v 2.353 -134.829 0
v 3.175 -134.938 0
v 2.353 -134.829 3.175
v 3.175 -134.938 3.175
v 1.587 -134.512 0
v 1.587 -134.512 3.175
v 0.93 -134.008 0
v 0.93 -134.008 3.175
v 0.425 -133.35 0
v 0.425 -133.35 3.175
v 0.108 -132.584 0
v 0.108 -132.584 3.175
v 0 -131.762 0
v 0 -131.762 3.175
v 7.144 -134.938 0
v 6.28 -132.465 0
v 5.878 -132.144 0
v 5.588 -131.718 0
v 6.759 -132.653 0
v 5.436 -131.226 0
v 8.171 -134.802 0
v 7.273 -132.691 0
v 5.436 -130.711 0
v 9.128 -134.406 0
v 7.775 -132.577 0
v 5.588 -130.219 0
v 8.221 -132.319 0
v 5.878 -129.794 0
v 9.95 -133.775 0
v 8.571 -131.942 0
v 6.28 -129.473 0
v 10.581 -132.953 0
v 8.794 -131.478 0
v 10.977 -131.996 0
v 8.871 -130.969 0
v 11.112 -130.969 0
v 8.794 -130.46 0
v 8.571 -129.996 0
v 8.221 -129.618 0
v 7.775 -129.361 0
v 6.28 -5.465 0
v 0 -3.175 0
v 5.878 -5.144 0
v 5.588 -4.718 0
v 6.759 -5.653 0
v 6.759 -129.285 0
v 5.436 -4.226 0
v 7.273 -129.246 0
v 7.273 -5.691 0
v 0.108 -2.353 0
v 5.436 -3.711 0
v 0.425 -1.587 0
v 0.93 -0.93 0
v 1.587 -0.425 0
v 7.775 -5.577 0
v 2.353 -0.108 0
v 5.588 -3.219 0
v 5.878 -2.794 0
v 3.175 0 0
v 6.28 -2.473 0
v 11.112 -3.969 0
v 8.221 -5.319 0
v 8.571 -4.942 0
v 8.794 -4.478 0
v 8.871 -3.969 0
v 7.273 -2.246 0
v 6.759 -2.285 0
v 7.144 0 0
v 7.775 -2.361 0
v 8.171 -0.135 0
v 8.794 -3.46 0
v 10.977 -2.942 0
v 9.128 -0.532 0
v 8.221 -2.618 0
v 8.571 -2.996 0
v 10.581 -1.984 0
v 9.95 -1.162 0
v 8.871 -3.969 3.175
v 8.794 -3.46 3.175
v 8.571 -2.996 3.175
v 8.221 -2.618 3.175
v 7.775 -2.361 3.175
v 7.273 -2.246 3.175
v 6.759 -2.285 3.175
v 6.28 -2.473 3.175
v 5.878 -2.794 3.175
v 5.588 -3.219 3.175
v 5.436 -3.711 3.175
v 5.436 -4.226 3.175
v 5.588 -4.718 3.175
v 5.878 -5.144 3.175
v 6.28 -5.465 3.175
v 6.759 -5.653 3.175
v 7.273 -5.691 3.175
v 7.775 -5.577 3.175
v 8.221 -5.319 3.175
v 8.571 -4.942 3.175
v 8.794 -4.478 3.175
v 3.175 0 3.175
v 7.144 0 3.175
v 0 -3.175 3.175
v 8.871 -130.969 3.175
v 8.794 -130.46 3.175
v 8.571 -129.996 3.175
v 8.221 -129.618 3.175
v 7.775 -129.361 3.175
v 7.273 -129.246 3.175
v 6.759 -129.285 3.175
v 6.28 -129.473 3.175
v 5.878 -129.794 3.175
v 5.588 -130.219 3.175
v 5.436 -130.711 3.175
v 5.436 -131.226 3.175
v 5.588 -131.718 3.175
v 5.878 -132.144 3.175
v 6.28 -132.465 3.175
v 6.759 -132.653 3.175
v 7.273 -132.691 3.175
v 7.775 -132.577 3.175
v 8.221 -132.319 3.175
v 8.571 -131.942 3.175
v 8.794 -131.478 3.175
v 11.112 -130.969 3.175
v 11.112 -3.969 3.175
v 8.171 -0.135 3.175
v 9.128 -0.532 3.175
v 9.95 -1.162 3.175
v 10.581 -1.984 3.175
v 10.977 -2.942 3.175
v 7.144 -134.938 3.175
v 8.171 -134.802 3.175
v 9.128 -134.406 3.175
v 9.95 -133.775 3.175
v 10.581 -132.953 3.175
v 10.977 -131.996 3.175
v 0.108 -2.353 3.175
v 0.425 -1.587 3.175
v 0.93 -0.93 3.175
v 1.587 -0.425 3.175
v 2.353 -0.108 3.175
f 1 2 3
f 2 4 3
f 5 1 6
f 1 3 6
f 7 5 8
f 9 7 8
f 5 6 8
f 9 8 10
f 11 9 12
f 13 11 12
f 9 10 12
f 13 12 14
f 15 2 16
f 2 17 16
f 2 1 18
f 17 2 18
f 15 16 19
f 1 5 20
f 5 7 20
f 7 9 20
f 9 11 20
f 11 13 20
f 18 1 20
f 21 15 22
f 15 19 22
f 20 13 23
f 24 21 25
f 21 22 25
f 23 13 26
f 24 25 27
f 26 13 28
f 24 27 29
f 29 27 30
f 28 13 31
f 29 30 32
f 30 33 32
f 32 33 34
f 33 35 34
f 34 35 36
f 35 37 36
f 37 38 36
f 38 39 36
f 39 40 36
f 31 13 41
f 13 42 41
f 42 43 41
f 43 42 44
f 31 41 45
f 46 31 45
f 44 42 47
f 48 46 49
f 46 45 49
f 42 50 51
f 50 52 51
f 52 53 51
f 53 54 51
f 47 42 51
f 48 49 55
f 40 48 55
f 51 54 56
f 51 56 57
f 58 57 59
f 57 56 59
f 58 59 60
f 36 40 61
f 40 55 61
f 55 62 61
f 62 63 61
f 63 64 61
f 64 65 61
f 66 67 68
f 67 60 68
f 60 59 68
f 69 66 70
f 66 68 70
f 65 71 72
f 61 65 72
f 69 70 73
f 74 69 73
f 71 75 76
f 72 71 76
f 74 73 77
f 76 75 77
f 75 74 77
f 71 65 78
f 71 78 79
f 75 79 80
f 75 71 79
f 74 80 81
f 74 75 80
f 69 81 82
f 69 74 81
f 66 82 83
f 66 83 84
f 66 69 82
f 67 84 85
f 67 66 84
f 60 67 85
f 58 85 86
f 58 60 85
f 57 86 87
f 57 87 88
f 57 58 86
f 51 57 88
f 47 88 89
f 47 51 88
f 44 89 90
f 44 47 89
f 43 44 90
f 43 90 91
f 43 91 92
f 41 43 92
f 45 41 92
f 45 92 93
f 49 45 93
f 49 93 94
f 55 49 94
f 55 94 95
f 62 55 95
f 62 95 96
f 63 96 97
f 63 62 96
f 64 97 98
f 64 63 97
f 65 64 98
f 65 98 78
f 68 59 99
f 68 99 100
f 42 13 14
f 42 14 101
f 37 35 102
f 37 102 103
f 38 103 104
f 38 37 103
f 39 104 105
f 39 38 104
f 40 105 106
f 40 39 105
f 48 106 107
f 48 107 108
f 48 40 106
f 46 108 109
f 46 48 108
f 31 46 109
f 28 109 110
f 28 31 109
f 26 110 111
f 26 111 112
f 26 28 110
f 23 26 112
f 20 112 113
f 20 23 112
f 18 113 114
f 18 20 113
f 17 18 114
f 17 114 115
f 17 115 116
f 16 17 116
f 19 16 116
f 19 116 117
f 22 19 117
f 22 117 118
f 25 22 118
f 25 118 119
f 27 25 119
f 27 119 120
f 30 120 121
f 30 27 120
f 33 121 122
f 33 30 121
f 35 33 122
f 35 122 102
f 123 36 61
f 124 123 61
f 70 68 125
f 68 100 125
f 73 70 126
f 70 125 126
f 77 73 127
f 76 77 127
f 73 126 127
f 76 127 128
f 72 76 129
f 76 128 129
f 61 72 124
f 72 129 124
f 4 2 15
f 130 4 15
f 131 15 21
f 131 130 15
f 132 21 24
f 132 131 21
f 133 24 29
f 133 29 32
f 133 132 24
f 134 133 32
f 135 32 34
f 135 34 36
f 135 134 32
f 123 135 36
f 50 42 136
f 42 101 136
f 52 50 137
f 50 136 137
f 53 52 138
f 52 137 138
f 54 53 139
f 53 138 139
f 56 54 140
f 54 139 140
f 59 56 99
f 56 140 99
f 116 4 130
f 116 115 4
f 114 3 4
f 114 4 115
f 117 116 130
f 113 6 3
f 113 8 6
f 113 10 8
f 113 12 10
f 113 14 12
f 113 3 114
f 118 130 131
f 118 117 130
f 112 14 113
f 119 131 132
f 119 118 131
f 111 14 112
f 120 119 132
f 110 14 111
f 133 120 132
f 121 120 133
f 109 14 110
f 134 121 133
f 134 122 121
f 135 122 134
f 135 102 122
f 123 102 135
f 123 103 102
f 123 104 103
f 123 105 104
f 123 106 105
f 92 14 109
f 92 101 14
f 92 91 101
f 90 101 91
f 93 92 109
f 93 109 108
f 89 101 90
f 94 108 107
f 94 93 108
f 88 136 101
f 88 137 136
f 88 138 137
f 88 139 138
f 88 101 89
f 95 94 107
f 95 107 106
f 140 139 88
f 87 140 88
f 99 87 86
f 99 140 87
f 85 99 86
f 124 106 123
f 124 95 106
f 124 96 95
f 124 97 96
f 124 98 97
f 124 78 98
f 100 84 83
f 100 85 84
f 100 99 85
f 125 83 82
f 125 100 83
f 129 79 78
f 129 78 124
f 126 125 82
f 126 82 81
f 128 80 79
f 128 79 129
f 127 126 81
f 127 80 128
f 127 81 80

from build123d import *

# Parameters (mm, degrees)
F0_W     = 11.1125
F0_H     = 134.9375
F0_R     = 1.7272
F1_DEPTH = 3.175
F2_R     = 3.96875
F3_R     = 3.175


with BuildPart() as f1:
    # F0 (on Top) → F1 (new body)
    with BuildSketch(Plane.XY):
        with Locations((5.55625, -67.46875)):
            Rectangle(F0_W, F0_H)
        with Locations((7.14375, -130.96875)):
            Circle(F0_R, mode=Mode.SUBTRACT)
        with Locations((7.14375, -3.96875)):
            Circle(F0_R, mode=Mode.SUBTRACT)
    extrude(amount=F1_DEPTH)

    # F2
    f2_edges = [f1.edges().sort_by_distance(p)[0] for p in [
        (11.1125, 0, 1.5875),
        (11.1125, -134.9375, 1.5875),
    ]]
    fillet(f2_edges, radius=F2_R)

    # F3
    f3_edges = [f1.edges().sort_by_distance(p)[0] for p in [
        (0, -134.9375, 1.5875),
        (0, 0, 1.5875),
    ]]
    fillet(f3_edges, radius=F3_R)


solid = f1.part
